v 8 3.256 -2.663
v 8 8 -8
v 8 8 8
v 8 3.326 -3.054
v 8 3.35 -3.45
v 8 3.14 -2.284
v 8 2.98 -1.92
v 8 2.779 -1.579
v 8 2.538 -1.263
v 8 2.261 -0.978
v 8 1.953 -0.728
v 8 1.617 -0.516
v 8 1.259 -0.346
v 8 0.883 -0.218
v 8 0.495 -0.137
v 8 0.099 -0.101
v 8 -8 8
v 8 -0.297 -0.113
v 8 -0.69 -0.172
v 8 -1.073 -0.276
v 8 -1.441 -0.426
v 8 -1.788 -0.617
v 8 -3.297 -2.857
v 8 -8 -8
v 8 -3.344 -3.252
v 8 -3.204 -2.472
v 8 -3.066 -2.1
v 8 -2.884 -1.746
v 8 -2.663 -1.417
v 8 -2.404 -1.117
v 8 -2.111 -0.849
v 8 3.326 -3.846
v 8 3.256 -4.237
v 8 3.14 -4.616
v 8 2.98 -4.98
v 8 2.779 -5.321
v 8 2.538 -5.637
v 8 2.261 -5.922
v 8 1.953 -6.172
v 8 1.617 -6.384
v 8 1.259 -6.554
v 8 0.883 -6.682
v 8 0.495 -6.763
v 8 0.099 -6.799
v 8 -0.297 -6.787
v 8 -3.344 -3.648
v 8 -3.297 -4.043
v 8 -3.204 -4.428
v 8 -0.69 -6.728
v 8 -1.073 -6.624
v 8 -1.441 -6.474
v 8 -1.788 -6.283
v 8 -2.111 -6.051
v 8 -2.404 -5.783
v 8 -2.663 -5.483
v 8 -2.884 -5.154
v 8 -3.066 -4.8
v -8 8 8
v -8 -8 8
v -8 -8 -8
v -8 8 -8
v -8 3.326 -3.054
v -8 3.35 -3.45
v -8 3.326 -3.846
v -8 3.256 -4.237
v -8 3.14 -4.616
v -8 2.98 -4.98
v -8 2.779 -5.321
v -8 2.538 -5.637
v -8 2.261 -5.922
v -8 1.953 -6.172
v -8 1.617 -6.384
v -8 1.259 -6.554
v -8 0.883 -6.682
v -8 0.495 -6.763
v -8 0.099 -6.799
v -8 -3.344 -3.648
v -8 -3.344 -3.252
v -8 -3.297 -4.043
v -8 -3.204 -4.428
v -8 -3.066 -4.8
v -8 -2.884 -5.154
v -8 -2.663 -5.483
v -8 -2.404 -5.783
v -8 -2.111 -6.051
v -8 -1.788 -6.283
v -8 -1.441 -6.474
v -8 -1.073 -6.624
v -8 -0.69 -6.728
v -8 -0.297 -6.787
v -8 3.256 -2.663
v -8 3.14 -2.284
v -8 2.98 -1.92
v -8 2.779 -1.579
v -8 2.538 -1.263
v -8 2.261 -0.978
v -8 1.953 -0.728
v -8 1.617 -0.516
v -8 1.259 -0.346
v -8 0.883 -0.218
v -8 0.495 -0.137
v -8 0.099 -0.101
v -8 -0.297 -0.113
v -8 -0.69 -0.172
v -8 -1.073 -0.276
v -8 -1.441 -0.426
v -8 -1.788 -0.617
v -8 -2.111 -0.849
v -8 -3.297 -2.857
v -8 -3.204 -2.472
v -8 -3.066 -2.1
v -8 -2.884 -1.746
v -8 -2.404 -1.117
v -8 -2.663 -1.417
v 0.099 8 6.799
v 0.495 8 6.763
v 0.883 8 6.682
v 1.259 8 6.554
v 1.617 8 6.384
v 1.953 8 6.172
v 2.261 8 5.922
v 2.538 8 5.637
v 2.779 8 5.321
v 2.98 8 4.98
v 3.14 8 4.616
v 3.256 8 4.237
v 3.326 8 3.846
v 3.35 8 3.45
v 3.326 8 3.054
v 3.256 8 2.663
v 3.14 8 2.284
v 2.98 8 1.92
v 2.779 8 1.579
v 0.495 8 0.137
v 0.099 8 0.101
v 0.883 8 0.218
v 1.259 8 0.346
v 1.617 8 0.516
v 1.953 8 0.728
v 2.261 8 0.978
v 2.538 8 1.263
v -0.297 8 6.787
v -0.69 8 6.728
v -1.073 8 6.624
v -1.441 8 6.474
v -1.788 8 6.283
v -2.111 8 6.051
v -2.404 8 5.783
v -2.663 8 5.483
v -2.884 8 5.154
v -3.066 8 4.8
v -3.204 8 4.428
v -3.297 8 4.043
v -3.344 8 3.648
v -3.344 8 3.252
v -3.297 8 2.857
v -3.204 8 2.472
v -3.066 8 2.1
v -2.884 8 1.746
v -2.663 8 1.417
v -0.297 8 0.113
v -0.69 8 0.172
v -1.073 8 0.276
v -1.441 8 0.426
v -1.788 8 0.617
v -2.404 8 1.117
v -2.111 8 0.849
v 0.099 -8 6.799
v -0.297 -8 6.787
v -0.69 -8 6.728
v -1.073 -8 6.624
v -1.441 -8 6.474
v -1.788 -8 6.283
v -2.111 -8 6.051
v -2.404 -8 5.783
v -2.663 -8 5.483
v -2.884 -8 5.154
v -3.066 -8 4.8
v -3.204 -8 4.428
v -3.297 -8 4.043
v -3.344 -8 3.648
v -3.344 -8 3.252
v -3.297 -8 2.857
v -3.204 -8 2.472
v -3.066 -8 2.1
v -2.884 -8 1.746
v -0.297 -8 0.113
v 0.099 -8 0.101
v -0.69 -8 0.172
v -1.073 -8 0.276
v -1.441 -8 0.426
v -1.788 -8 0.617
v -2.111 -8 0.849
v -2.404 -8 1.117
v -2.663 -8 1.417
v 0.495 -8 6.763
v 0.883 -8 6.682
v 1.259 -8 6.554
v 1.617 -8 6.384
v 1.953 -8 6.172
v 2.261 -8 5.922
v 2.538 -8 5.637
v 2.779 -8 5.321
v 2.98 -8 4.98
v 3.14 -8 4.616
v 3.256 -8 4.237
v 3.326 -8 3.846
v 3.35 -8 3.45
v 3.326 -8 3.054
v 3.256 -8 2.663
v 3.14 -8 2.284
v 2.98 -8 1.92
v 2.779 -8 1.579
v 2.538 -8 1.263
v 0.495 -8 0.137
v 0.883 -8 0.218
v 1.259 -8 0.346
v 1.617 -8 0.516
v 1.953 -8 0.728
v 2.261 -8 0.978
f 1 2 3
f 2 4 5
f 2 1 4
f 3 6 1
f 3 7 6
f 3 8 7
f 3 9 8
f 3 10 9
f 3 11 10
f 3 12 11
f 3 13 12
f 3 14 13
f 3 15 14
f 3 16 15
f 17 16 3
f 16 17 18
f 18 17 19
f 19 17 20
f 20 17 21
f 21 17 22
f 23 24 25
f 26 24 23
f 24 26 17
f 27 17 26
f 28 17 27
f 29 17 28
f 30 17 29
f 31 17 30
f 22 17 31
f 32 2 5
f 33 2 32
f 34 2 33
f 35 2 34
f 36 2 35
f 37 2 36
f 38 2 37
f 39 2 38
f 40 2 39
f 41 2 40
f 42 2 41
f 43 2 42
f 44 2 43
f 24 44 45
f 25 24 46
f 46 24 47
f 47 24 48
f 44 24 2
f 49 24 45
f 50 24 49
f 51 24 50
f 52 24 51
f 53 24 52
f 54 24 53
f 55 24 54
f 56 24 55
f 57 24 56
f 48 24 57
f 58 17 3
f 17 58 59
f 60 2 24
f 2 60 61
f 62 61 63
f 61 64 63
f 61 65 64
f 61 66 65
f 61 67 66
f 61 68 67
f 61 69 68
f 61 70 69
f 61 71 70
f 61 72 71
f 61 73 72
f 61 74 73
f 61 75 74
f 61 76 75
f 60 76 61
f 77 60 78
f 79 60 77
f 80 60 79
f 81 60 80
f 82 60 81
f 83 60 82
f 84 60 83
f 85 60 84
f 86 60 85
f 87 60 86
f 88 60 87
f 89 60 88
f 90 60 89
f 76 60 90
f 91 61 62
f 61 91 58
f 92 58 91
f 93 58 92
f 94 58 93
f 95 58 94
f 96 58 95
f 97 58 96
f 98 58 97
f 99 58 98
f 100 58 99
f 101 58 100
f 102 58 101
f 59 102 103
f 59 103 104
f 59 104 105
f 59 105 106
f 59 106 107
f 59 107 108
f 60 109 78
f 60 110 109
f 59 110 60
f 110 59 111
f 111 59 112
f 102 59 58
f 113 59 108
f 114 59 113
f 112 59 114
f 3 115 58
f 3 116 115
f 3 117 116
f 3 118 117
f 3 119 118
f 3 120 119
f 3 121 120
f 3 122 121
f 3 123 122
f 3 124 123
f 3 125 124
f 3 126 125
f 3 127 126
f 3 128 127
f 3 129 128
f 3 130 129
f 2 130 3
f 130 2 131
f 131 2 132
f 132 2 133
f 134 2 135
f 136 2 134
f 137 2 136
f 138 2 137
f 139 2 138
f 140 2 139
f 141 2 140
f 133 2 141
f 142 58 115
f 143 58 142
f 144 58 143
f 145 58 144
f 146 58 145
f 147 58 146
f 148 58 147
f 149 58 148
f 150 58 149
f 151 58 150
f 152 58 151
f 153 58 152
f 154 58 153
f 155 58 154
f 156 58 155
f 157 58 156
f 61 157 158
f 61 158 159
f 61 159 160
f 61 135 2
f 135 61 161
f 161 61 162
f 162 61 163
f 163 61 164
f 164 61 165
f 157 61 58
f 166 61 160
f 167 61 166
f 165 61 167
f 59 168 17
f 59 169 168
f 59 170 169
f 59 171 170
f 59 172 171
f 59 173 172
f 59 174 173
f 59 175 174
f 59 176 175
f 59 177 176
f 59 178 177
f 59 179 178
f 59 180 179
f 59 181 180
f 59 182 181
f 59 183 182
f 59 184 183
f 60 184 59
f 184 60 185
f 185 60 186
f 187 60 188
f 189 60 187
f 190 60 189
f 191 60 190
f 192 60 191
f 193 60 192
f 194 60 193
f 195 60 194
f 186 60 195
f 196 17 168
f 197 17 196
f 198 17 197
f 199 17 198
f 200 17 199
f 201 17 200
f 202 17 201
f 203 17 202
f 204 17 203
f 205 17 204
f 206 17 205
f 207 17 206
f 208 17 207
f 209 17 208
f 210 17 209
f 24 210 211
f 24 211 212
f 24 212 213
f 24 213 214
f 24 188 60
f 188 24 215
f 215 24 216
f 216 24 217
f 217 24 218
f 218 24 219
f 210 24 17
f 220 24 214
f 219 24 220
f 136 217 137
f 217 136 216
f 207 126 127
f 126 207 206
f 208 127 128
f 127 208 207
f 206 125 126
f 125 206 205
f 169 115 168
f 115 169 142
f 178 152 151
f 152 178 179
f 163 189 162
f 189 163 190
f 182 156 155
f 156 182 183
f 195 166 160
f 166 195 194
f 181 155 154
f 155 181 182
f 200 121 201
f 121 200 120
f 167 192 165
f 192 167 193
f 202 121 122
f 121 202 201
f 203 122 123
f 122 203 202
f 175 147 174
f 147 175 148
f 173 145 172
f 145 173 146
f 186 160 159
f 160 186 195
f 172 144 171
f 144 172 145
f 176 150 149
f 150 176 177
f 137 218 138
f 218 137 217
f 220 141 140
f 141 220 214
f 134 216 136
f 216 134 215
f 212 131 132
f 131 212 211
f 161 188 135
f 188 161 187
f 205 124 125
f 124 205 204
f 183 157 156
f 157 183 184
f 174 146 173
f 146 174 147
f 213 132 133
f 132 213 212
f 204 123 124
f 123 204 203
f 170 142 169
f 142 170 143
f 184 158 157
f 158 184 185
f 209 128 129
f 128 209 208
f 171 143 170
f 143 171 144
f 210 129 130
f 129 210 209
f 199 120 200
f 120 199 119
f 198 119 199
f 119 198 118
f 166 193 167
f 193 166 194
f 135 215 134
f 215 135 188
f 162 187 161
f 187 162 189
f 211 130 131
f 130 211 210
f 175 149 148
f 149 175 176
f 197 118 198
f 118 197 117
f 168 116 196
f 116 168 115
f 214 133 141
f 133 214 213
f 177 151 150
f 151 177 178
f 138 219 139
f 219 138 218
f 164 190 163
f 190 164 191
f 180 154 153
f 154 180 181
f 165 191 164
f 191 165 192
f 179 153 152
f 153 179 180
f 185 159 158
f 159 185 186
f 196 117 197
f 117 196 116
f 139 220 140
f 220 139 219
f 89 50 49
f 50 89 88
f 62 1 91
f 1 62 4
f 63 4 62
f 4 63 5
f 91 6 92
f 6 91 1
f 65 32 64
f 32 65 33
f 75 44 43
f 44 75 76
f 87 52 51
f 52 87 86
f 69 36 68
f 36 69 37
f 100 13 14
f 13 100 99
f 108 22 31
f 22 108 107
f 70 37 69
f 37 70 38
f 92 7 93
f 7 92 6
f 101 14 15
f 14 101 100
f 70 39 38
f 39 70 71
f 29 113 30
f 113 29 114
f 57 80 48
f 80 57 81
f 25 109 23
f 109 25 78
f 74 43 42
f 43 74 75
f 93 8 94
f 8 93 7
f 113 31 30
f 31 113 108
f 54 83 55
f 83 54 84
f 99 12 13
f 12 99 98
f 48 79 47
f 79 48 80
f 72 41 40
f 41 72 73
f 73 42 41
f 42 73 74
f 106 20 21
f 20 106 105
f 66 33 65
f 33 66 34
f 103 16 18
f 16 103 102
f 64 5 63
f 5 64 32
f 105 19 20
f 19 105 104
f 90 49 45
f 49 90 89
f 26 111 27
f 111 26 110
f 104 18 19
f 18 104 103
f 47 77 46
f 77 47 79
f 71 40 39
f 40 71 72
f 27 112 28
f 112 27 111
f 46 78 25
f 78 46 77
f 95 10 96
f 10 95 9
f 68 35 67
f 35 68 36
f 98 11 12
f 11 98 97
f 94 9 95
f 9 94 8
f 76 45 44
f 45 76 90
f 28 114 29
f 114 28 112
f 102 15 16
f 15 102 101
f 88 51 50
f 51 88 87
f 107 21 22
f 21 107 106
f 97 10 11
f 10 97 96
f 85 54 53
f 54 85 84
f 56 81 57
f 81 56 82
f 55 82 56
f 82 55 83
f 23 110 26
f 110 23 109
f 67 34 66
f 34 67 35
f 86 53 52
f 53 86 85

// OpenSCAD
$fa = 1;
$fs = 0.4;

//Fit the rod
holediameter=6.7;

//For enough strength, and also matching Cura wall
//Start with cura wall size
curawalltopbottom=0.8;
curainternalwall=0.4;
wallmin=curawalltopbottom+curainternalwall;

tileheight=16;

//Offset holes to match wallmin from top/bottom wall
holeoffset=tileheight/2-holediameter/2-wallmin;

difference () {
  cube([tileheight,tileheight,tileheight], center = true);
  translate([0,0,holeoffset]) rotate([90,0,0]) cylinder(d=holediameter,h=tileheight,center=true);
  translate([0,0,-holeoffset]) rotate([90,0,90]) cylinder(d=holediameter,h=tileheight,center=true);
}
